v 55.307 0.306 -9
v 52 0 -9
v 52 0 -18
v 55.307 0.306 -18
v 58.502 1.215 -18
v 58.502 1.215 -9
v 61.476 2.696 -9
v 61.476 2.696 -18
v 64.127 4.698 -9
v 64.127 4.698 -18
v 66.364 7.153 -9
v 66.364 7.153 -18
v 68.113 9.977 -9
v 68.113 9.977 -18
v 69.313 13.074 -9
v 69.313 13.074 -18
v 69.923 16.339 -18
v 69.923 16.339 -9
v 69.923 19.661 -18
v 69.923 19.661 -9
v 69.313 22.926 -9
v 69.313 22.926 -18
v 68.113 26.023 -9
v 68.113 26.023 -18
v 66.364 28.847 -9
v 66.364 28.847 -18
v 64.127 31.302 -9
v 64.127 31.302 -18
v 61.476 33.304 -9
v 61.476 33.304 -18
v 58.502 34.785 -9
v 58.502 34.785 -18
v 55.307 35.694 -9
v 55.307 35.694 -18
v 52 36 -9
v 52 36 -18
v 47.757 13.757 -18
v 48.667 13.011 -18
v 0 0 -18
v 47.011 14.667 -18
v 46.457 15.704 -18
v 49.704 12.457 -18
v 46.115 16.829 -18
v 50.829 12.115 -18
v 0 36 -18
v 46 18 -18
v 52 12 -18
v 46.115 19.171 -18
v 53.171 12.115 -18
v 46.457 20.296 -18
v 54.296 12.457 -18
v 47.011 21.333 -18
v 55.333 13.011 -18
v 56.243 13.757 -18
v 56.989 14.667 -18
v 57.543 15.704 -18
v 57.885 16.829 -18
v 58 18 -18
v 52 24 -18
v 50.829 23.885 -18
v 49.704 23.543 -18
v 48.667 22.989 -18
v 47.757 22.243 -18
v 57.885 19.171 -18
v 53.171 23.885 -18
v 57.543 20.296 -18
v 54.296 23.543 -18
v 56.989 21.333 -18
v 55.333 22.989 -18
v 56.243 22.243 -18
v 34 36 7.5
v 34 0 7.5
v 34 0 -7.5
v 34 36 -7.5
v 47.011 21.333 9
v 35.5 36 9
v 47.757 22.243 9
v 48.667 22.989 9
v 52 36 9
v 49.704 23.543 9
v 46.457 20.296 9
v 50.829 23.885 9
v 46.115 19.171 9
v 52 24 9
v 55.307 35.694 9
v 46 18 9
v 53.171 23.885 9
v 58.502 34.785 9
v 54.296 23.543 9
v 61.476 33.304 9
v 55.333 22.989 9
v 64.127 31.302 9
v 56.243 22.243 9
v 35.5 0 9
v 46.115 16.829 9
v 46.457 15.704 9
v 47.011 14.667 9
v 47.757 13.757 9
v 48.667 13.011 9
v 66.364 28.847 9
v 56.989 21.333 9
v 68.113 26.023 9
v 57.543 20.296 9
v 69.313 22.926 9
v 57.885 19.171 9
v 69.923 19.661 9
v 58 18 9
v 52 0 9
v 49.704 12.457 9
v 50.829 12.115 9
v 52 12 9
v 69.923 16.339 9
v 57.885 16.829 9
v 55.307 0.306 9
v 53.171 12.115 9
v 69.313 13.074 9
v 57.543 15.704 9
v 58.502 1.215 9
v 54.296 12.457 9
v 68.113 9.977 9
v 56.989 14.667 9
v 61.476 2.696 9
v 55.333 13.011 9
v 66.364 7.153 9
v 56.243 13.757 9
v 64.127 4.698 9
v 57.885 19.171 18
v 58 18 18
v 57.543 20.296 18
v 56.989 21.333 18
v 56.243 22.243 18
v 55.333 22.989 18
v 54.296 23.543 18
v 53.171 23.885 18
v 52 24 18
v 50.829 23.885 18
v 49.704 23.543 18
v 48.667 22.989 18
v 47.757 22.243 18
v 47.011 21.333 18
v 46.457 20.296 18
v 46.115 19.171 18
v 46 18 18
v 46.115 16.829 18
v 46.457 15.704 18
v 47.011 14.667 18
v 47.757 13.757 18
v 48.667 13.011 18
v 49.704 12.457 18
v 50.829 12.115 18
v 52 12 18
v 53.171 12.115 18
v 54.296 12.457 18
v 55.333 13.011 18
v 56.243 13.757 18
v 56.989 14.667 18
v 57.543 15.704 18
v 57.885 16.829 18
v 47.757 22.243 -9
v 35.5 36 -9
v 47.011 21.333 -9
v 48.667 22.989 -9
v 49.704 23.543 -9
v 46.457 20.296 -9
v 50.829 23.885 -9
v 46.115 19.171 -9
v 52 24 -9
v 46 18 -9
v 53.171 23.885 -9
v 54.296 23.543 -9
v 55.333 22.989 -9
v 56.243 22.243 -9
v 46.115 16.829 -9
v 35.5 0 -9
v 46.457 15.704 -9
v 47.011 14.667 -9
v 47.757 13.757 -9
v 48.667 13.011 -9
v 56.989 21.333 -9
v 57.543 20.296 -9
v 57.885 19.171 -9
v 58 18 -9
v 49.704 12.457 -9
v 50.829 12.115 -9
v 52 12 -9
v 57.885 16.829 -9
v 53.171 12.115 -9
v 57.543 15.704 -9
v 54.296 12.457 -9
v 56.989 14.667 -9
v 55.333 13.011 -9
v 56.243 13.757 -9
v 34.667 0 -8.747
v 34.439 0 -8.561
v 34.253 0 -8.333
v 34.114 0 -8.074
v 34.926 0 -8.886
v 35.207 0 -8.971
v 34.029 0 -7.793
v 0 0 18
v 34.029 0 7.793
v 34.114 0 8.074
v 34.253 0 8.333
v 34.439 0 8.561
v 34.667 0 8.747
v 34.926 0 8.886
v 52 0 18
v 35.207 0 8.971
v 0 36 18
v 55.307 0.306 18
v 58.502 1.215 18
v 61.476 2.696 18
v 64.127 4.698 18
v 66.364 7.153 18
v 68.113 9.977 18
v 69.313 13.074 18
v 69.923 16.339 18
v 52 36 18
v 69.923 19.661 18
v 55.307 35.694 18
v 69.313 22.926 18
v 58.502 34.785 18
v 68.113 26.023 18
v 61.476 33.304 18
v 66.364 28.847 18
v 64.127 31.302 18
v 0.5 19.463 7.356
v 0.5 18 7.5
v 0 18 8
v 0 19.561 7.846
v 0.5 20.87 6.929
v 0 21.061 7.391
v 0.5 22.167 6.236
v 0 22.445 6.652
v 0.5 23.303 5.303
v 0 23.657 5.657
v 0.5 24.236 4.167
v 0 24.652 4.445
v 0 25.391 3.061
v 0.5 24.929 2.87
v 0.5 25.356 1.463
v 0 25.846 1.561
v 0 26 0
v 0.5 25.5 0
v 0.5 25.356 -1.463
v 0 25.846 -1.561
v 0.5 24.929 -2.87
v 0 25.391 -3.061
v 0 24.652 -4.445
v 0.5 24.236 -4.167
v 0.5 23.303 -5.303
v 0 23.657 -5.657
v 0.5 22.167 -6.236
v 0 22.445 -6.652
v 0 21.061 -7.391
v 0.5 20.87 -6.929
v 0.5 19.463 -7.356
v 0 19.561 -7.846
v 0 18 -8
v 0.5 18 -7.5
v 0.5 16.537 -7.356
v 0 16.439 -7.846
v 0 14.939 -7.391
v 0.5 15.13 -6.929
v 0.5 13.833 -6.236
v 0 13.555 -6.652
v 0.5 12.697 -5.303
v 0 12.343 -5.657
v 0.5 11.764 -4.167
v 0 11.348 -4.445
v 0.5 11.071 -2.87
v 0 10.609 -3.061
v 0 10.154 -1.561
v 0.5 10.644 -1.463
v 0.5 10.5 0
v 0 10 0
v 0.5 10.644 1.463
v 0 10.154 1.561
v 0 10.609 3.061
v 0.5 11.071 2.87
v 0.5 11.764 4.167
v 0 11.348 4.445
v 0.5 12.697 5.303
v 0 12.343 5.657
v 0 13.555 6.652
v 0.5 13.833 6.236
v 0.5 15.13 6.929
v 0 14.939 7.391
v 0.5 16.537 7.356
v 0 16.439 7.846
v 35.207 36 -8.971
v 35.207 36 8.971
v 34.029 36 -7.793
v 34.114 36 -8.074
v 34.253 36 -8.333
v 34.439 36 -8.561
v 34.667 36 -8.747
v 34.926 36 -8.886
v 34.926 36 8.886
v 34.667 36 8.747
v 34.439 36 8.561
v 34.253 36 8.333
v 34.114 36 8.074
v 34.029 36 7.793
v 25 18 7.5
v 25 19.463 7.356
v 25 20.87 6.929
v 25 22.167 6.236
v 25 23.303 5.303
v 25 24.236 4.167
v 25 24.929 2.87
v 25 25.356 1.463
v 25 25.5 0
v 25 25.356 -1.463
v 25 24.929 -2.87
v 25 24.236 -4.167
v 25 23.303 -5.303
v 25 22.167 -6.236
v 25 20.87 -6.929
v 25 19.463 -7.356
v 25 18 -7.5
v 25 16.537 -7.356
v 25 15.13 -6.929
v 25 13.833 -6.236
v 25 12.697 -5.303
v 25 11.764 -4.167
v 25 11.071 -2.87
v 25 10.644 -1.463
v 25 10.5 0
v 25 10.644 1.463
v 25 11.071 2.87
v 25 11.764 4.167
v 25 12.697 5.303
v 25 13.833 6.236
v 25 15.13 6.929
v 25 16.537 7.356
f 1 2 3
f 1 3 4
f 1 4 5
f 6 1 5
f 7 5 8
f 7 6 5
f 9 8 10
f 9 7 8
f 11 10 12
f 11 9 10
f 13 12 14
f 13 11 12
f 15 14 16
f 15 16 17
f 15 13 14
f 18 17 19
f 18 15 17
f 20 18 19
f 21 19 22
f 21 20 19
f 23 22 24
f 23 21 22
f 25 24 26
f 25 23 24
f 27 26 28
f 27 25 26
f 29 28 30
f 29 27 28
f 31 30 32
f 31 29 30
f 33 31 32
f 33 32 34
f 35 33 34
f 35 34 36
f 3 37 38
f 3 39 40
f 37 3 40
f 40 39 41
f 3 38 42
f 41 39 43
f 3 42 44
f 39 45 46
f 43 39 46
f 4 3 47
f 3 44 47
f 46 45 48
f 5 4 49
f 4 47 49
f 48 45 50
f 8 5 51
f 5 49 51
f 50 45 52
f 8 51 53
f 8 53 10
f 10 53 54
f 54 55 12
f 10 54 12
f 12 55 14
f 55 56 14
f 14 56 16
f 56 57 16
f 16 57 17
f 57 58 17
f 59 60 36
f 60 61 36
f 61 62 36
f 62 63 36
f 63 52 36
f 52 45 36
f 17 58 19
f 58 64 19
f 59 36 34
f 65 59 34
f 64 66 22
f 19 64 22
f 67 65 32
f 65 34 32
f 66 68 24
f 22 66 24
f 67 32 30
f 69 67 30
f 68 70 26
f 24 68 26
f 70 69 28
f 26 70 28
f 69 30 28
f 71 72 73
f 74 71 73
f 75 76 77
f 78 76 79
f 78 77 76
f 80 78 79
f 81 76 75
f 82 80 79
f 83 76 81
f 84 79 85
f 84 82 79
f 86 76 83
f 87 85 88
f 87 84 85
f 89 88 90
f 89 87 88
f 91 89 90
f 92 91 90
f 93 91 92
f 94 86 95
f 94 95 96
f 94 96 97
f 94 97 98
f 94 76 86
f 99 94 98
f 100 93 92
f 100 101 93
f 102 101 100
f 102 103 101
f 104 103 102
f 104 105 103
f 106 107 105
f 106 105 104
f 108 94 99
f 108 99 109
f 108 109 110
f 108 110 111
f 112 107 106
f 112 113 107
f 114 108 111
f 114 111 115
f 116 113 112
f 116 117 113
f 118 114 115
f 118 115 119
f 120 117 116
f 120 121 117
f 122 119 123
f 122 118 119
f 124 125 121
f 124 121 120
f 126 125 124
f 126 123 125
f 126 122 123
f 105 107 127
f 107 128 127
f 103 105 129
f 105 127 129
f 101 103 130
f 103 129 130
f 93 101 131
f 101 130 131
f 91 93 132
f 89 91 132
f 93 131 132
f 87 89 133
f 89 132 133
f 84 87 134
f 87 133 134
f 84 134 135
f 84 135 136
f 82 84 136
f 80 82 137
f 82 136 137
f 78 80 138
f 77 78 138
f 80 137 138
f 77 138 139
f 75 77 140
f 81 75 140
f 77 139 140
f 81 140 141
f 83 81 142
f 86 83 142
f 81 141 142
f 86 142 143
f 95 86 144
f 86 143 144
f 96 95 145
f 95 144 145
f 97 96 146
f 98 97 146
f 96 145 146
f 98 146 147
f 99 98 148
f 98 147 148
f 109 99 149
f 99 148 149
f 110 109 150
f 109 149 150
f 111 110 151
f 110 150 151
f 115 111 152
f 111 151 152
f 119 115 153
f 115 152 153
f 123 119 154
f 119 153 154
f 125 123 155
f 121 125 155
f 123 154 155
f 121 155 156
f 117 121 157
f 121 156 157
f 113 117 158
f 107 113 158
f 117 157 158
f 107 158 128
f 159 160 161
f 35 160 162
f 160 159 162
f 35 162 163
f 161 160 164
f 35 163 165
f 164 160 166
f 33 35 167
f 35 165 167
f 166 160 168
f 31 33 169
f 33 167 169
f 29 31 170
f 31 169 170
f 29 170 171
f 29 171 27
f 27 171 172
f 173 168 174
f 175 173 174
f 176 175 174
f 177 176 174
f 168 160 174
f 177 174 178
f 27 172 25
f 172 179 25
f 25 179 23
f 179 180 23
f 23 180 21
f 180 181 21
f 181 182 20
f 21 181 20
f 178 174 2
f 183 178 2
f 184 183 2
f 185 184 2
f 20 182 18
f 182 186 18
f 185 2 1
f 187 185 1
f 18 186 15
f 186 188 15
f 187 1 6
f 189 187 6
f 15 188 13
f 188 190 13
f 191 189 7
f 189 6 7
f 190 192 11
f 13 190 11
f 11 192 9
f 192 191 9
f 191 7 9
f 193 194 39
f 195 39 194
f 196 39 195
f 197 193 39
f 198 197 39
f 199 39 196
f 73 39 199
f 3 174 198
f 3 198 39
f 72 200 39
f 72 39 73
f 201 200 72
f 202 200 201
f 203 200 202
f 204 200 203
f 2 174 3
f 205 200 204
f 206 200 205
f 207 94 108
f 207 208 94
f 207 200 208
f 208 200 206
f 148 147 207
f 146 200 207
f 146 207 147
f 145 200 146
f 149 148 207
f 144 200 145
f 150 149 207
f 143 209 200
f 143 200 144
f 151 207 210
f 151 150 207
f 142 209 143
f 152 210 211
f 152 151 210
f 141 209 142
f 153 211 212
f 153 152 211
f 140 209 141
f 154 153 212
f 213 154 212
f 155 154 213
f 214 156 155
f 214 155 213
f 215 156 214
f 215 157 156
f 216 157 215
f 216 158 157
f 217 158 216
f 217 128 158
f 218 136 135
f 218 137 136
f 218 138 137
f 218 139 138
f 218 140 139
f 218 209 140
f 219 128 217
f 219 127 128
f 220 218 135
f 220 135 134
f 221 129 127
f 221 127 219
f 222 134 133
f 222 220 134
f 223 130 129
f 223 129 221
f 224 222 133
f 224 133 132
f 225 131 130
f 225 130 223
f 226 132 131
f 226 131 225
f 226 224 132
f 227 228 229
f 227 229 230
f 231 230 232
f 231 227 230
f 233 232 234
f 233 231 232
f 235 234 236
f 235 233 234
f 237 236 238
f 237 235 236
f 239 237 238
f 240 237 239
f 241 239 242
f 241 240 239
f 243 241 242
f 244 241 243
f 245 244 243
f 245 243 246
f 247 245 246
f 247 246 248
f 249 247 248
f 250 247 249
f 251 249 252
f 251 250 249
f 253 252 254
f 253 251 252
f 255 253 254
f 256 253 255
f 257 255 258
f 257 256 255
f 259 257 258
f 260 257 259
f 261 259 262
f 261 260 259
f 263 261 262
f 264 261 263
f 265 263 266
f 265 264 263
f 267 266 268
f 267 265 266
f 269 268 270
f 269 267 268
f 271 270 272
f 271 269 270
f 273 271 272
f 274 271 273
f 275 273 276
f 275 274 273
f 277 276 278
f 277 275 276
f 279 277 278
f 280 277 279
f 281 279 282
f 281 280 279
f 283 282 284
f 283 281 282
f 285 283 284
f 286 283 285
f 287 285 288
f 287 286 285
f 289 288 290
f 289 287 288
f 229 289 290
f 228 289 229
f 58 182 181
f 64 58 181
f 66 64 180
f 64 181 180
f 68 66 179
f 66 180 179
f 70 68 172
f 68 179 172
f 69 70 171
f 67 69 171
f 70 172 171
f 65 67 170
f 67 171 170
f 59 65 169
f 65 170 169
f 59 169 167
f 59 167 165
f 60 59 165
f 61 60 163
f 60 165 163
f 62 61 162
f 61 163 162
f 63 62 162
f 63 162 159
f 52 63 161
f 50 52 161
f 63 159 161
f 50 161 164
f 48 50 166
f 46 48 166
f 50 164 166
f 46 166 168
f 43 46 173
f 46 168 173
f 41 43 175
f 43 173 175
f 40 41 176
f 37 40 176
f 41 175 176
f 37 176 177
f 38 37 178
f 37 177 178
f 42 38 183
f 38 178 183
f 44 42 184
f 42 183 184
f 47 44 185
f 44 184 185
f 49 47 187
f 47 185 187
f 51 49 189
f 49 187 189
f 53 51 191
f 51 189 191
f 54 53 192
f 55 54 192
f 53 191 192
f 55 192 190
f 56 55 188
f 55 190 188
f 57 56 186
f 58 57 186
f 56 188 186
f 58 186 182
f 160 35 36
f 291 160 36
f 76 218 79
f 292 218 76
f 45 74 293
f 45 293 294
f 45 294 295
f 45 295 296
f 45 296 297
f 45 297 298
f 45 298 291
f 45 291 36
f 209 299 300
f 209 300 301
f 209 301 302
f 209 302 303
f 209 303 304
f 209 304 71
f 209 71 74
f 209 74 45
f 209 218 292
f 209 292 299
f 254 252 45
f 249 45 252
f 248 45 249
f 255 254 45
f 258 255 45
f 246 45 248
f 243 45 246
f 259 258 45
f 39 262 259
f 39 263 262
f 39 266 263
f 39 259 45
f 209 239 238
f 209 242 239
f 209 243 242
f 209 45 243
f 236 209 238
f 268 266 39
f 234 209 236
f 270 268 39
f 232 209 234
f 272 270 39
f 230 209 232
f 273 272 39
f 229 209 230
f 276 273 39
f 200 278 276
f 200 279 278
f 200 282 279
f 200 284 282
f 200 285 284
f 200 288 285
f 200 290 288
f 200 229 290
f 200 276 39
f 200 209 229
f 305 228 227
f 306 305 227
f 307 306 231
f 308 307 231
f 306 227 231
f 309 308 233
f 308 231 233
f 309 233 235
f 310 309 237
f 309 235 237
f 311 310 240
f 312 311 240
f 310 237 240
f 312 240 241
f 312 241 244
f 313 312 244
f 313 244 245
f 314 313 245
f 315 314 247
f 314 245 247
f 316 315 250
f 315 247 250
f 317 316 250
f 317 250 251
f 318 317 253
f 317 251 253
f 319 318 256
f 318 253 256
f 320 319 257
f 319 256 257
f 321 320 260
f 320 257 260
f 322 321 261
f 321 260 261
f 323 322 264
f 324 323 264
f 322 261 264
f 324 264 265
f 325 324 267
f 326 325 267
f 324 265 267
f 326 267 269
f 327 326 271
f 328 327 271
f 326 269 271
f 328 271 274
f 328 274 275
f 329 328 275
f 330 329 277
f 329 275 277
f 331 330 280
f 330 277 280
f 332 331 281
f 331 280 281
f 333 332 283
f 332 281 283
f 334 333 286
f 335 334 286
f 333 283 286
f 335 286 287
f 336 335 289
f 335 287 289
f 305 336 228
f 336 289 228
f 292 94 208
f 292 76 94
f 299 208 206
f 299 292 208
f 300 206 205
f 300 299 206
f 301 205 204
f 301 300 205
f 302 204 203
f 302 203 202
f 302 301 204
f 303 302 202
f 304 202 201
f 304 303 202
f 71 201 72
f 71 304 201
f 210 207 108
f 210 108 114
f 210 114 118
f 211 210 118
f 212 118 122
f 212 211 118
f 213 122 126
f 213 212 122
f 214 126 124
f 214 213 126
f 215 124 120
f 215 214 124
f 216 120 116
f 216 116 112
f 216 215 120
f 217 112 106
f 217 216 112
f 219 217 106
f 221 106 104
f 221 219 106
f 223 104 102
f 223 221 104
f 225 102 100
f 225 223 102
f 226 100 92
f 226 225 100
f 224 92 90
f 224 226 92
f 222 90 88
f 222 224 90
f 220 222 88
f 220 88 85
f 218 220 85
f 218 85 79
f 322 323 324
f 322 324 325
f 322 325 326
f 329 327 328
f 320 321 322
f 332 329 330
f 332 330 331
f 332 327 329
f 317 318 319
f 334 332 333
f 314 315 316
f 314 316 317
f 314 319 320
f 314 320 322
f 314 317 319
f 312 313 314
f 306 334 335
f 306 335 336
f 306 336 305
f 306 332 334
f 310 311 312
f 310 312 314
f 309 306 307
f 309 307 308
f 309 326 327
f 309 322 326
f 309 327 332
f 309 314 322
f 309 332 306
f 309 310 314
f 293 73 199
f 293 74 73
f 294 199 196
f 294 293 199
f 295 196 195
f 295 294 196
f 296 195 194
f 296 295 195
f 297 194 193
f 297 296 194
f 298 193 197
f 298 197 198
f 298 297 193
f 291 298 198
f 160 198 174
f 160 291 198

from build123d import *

# Parameters (mm, degrees)
CLEVIS_BODY_EXTRUDE1_DEPTH       = 18
SKETCH2_R                        = 6
PIN_HOLES_CUT_EXTRUDE1_DEPTH     = 18
SKETCH3_R                        = 7.5
THREADED_HOLE_CUT_EXTRUDE2_DEPTH = 25
SKETCH5_W                        = 38
SKETCH5_H                        = 18
CLEVIS_GAP_CUT_EXTRUDE4_DEPTH    = 37
FILLET2_R                        = 1.5
CHAMFER2_SIZE                    = 0.5


with BuildPart() as part:
    # Sketch1 → Clevis Body Extrude1 (new body, symmetric)
    with BuildSketch(Plane.XY):
        with BuildLine():
            Line((0, 0), (52, 0))
            ThreePointArc((52, 0), (70, 18), (52, 36))
            Line((52, 36), (0, 36))
            Line((0, 36), (0, 0))
        make_face()
    extrude(amount=CLEVIS_BODY_EXTRUDE1_DEPTH, both=True)

    # Sketch2 → Pin Holes Cut-Extrude1 (cut, symmetric)
    with BuildSketch(Plane.XY):
        with Locations((52, 18)):
            Circle(SKETCH2_R)
    extrude(amount=PIN_HOLES_CUT_EXTRUDE1_DEPTH, both=True, mode=Mode.SUBTRACT)

    # Sketch3 → Threaded Hole Cut-Extrude2 (cut)
    with BuildSketch(Plane.ZY):
        with Locations((0, 18)):
            Circle(SKETCH3_R)
    extrude(amount=-THREADED_HOLE_CUT_EXTRUDE2_DEPTH, mode=Mode.SUBTRACT)

    # Sketch5 → Clevis Gap Cut-Extrude4 (cut, through all)
    with BuildSketch(Plane(origin=(0, 0, 0), x_dir=(1, 0, 0), z_dir=(0, 1, 0))):
        with Locations((53, 0)):
            Rectangle(SKETCH5_W, SKETCH5_H)
    extrude(amount=CLEVIS_GAP_CUT_EXTRUDE4_DEPTH, mode=Mode.SUBTRACT)

    # Fillet2
    fillet2_edges = [part.edges().sort_by_distance(p)[0] for p in [
        (34, 18, 9),
        (34, 18, -9),
    ]]
    fillet(fillet2_edges, radius=FILLET2_R)

    # Chamfer2
    chamfer2_edges = [part.edges().sort_by_distance(p)[0] for p in [
        (0, 18, -7.5),
    ]]
    chamfer(chamfer2_edges, length=CHAMFER2_SIZE)


solid = part.part
